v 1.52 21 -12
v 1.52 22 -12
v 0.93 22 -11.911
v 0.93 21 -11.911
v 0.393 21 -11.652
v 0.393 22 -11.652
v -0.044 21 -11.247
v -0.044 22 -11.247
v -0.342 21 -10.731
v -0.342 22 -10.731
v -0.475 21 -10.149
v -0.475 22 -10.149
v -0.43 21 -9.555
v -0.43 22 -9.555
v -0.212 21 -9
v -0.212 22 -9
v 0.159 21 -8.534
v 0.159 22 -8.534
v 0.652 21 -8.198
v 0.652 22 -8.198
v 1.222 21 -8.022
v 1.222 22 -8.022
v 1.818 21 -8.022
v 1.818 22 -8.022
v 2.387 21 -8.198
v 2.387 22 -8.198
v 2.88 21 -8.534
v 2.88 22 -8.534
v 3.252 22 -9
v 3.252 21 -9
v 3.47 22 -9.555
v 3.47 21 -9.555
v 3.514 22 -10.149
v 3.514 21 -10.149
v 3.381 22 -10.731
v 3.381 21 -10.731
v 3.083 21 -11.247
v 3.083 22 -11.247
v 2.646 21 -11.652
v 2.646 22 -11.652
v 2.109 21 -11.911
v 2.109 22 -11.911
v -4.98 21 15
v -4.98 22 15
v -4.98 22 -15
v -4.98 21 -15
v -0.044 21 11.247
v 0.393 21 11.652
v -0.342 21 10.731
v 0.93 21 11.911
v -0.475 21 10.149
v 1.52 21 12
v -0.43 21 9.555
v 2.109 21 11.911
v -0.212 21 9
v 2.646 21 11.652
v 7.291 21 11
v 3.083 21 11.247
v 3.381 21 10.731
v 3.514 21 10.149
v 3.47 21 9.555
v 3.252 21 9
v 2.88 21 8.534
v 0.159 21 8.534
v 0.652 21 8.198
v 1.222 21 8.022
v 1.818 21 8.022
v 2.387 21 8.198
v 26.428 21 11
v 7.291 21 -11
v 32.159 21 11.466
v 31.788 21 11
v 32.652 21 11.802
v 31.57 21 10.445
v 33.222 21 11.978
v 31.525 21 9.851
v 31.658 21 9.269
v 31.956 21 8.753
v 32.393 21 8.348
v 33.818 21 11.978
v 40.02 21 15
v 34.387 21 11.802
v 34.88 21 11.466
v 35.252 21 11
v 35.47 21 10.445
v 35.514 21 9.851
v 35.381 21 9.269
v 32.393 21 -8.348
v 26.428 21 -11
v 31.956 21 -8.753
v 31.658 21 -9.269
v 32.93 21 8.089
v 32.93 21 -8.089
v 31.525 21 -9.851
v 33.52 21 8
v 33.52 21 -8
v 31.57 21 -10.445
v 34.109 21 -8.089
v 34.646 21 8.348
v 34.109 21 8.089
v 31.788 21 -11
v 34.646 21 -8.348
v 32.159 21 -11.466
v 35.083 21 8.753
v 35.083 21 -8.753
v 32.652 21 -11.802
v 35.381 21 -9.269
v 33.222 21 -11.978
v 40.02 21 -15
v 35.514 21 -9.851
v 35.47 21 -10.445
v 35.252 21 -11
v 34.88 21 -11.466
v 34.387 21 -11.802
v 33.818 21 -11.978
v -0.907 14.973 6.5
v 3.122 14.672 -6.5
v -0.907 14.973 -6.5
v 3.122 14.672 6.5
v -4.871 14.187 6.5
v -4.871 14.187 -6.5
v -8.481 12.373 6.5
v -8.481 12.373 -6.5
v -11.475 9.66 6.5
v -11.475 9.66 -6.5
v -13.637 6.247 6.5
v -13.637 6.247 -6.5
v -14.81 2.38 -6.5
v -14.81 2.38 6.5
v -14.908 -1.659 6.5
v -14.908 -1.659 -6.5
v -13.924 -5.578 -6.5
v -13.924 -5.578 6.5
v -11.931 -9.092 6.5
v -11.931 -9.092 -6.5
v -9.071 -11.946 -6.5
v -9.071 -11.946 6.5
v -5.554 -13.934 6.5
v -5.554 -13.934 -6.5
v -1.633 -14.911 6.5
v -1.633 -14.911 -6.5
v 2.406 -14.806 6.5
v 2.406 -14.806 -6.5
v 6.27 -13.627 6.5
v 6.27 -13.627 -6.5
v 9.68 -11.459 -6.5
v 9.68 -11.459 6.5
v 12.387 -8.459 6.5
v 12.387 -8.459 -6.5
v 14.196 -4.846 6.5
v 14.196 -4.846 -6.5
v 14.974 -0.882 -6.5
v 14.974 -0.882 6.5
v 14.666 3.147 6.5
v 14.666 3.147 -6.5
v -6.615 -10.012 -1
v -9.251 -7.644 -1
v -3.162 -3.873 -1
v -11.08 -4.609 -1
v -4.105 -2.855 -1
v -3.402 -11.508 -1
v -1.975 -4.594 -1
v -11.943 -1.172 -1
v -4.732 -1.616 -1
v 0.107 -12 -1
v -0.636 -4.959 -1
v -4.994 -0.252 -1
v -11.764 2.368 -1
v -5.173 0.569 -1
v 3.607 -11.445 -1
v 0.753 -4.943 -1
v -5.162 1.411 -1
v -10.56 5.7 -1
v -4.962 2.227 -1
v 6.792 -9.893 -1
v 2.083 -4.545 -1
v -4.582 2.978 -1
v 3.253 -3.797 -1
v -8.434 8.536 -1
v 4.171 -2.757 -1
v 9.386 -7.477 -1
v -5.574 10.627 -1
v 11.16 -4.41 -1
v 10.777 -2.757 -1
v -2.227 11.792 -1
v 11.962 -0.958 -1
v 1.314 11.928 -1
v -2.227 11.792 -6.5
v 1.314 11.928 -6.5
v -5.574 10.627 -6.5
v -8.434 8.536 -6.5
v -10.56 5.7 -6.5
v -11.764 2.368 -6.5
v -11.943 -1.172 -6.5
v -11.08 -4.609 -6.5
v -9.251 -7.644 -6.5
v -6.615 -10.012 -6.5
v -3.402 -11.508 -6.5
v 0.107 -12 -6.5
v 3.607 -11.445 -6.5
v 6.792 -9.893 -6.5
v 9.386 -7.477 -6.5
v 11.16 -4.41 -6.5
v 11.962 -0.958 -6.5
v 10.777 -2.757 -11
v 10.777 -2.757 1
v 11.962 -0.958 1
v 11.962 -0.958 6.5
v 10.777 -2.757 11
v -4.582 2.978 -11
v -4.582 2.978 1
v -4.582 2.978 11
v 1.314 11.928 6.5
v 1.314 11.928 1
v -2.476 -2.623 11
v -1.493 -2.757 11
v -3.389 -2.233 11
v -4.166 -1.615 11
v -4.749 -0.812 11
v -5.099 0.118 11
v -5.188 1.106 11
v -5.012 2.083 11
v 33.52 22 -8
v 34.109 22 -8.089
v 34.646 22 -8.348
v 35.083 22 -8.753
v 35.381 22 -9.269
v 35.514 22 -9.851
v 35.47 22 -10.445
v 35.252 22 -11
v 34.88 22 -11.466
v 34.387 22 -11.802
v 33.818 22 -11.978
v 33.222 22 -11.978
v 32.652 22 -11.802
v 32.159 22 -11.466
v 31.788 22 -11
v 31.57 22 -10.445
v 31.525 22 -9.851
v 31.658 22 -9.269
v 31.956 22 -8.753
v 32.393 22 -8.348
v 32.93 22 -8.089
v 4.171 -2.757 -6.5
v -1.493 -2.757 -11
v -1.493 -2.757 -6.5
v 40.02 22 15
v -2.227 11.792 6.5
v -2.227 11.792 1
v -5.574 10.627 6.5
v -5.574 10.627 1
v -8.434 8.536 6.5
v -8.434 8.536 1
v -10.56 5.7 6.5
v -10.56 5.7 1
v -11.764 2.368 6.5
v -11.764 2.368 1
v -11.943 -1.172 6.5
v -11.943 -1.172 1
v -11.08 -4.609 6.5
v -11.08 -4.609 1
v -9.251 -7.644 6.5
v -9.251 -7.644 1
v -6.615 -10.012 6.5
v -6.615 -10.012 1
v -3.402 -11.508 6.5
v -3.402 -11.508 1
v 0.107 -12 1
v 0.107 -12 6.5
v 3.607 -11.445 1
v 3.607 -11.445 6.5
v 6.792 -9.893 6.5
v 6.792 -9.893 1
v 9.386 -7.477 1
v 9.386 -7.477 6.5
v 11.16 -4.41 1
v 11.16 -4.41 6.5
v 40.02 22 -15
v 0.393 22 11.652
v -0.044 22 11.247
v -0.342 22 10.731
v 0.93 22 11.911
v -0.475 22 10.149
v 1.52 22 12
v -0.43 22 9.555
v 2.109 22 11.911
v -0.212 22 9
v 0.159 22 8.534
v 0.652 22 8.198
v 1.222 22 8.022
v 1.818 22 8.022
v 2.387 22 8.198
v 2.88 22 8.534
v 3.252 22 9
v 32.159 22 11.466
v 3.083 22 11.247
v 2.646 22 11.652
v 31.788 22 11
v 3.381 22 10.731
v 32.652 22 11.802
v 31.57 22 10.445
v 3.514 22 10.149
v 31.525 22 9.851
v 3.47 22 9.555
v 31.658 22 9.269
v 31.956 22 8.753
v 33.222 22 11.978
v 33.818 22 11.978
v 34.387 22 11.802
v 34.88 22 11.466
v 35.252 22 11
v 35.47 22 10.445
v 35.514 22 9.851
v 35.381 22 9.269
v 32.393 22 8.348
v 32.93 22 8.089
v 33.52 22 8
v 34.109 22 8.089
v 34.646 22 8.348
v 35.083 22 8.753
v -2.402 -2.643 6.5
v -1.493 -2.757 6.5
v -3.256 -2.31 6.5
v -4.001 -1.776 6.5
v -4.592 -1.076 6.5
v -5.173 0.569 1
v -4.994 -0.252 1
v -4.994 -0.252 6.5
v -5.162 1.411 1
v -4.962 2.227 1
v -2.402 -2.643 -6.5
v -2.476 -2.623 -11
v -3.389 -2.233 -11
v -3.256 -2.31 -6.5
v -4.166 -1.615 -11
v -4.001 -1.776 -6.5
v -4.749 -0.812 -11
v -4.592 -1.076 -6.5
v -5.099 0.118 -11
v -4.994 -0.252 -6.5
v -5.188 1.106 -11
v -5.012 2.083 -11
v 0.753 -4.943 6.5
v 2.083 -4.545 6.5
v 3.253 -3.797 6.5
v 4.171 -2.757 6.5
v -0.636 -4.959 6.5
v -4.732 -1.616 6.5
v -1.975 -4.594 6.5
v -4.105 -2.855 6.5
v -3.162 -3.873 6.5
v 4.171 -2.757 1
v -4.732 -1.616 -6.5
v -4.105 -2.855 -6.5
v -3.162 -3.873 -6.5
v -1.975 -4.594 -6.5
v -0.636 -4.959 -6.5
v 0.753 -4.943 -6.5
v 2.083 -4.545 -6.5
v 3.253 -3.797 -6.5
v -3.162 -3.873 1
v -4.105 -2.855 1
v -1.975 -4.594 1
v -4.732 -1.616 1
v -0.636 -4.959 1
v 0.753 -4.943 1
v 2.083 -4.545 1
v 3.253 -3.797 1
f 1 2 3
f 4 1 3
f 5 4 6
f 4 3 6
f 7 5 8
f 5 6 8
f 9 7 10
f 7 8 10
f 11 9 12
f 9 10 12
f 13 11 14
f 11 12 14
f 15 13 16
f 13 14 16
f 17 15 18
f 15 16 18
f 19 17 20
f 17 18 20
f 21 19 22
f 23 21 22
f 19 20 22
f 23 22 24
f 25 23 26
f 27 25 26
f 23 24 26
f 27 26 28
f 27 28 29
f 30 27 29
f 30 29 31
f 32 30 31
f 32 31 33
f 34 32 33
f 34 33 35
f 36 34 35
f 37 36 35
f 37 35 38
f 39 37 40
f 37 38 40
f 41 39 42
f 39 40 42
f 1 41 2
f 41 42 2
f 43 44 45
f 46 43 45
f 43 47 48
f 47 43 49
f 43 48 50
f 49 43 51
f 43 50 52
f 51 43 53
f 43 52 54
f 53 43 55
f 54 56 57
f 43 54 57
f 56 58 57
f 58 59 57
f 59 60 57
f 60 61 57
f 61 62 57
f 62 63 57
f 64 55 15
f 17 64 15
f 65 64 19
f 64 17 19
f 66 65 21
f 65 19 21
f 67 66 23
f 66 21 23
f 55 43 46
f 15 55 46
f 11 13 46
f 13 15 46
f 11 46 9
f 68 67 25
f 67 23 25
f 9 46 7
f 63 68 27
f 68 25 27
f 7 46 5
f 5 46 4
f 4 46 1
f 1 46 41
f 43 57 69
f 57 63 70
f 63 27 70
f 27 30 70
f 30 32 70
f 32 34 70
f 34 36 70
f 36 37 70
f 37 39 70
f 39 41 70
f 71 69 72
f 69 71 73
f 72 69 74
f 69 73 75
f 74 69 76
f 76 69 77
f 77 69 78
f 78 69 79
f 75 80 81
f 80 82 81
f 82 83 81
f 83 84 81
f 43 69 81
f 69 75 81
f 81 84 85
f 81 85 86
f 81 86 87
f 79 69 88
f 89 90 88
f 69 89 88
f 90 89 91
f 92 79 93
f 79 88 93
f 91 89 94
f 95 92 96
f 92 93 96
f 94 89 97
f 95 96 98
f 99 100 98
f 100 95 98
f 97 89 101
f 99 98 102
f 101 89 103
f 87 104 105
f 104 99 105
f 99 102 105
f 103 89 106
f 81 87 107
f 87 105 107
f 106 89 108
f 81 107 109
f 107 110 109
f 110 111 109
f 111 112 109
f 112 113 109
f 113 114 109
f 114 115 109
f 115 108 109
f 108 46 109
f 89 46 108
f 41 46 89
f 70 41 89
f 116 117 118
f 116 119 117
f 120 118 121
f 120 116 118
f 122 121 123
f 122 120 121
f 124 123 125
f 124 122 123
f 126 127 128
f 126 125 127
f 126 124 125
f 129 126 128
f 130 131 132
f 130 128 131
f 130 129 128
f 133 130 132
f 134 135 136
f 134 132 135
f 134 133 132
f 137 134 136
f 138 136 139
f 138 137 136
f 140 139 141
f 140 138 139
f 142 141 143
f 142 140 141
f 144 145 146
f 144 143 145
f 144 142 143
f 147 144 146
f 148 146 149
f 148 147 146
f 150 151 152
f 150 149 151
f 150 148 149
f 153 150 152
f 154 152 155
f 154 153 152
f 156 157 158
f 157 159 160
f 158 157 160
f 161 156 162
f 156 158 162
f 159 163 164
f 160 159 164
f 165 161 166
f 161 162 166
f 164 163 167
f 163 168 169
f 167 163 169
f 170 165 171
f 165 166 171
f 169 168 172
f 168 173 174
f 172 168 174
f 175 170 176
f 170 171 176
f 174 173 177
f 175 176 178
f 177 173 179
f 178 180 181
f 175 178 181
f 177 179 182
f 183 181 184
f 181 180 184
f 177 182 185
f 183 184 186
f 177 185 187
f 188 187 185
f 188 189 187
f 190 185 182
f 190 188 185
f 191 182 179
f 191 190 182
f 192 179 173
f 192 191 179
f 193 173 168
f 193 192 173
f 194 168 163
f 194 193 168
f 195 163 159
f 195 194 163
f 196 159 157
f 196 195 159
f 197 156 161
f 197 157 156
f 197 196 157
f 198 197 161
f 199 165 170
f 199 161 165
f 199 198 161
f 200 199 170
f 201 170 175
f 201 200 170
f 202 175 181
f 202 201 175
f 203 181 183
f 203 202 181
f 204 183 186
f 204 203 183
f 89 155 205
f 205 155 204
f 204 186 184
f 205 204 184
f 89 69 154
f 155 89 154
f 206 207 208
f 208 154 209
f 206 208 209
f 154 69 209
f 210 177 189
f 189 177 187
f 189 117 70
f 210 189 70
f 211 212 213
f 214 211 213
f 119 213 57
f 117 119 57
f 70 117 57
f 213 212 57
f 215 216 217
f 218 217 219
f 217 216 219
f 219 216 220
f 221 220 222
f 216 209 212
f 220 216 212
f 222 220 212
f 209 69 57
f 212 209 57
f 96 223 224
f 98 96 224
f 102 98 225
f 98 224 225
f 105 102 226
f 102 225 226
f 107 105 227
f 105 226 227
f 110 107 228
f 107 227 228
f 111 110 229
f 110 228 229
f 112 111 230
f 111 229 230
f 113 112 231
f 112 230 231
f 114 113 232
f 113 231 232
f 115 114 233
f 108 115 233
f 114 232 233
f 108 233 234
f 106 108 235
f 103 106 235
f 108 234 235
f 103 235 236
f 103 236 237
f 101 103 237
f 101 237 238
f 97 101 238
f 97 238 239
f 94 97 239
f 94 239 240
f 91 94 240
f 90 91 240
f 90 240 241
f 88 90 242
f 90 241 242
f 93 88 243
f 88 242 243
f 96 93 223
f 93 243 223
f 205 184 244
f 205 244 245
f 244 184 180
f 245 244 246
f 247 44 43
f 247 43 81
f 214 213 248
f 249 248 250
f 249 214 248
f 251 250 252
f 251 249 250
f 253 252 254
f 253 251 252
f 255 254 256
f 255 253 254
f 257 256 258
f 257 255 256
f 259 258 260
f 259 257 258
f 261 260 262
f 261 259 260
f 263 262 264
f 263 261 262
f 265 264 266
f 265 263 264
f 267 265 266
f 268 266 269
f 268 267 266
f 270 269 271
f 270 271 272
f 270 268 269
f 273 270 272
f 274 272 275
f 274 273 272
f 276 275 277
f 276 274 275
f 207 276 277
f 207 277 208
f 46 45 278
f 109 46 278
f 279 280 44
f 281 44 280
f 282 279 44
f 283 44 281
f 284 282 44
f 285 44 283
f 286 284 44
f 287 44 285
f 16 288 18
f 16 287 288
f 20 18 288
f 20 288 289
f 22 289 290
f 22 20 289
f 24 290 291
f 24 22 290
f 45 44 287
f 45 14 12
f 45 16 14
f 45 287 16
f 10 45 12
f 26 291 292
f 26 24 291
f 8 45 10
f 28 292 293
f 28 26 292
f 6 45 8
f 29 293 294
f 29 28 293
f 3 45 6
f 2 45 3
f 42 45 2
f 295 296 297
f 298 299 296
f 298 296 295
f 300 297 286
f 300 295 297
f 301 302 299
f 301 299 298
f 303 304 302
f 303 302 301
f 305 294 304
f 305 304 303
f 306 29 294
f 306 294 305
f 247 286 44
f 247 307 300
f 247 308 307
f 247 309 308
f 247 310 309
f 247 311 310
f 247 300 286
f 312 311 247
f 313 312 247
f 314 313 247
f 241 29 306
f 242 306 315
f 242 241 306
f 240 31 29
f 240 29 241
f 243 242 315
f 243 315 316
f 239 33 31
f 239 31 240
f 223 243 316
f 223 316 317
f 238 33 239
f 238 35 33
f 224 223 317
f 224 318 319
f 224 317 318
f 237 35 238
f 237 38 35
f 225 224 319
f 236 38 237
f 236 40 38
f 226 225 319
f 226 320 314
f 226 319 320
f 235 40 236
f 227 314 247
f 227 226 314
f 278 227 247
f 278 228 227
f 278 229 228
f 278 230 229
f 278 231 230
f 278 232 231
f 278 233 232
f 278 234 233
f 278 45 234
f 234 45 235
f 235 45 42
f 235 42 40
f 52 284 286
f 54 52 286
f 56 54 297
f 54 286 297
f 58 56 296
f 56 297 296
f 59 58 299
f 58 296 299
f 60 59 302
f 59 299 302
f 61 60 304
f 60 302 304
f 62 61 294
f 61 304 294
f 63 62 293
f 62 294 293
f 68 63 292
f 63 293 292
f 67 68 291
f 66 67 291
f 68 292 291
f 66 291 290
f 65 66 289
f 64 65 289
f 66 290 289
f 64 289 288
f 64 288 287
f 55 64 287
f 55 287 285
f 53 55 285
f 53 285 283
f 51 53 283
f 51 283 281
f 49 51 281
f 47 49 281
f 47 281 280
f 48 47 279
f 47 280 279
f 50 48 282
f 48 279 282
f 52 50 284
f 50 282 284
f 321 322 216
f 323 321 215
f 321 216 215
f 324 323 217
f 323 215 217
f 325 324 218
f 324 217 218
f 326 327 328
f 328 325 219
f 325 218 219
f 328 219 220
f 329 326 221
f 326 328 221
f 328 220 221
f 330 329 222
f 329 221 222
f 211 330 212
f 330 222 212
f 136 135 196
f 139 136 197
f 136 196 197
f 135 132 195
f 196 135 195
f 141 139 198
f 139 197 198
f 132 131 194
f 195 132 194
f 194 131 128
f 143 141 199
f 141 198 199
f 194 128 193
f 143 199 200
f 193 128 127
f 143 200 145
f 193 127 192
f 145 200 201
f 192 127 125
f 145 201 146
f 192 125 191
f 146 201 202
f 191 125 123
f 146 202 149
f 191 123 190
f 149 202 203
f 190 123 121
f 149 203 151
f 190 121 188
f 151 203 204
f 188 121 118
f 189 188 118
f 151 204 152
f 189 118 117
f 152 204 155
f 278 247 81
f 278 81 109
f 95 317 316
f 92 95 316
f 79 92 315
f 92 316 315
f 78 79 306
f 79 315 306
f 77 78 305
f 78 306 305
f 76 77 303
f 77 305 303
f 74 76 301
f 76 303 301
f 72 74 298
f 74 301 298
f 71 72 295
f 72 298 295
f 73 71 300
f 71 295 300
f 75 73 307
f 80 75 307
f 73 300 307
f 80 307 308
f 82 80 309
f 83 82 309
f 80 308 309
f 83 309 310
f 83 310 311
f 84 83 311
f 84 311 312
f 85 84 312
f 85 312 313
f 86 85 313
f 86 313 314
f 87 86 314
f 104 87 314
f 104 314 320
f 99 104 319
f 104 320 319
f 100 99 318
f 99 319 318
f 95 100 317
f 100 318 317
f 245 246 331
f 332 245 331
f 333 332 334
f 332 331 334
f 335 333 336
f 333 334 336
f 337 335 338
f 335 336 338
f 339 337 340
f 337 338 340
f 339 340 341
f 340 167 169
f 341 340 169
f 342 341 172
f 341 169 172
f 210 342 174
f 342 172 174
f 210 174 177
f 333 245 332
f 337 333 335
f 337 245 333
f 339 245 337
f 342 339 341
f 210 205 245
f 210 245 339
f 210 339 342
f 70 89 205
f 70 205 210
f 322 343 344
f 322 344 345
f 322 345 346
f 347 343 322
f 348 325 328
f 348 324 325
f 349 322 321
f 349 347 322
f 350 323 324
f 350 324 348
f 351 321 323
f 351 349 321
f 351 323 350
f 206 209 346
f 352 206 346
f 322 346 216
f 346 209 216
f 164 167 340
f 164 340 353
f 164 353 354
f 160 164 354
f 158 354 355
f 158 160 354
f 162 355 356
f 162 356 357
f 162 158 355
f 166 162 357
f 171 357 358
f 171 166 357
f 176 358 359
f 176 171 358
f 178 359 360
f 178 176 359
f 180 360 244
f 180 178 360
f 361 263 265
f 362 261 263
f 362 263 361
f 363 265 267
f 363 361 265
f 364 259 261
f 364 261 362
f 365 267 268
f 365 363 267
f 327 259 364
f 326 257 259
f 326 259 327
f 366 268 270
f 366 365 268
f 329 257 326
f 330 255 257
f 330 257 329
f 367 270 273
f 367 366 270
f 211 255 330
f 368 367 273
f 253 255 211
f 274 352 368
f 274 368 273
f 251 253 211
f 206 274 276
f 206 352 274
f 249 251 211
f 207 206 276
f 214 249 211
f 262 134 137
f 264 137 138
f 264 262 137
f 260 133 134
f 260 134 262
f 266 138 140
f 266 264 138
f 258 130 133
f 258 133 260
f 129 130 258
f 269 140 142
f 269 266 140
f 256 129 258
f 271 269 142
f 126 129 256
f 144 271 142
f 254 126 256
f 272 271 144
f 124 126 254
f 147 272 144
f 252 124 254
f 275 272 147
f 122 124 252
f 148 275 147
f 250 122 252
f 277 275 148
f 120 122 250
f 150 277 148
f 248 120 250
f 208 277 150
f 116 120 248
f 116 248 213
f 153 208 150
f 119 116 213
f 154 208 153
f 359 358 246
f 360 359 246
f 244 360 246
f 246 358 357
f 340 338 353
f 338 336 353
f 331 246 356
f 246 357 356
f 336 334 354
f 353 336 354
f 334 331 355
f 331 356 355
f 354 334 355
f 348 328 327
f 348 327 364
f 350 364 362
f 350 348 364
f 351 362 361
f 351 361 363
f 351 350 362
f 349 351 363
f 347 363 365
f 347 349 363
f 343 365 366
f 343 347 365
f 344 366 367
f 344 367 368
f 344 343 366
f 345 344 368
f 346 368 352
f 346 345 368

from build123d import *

# Parameters (mm, degrees)
CROQUIS1_R              = 15
CROQUIS1_R_2            = 12
EXTRUIR_L_MINA1_DEPTH   = 6.5
CROQUIS2_R              = 5
SALIENTE_EXTRUIR1_DEPTH = 6.5
CROQUIS3_R              = 12.5
SALIENTE_EXTRUIR2_DEPTH = 1
CROQUIS4_R              = 2
SALIENTE_EXTRUIR3_DEPTH = 11
SALIENTE_EXTRUIR4_DEPTH = 22
CROQUIS7_W              = 45
CROQUIS7_H              = 30
CROQUIS7_R              = 2
SALIENTE_EXTRUIR5_DEPTH = 1


with BuildPart() as part:
    # Croquis1 → Extruir-Lámina1 (new, symmetric)
    with BuildSketch(Plane.XY):
        Circle(CROQUIS1_R)
        Circle(CROQUIS1_R_2, mode=Mode.SUBTRACT)
    extrude(amount=EXTRUIR_L_MINA1_DEPTH, both=True)



with BuildPart() as body_2:
    # Croquis2 → Saliente-Extruir1 (new, symmetric)
    with BuildSketch(Plane.XY):
        with Locations(Location((0, 0, 0), (0, 0, 180))):
            Circle(CROQUIS2_R)
    extrude(amount=SALIENTE_EXTRUIR1_DEPTH, both=True)


with BuildPart() as part_1:
    add(part.part)

    add(body_2.part)  # Saliente-Extruir2 merges body 2
    # Croquis3 → Saliente-Extruir2 (add, symmetric)
    with BuildSketch(Plane.XY):
        Circle(CROQUIS3_R)
    extrude(amount=SALIENTE_EXTRUIR2_DEPTH, both=True)

    # Croquis4 → Saliente-Extruir3 (add, symmetric)
    with BuildSketch(Plane.XY):
        Circle(CROQUIS4_R)
    extrude(amount=SALIENTE_EXTRUIR3_DEPTH, both=True)

    # Croquis6 → Saliente-Extruir4 (add, through all)
    with BuildSketch(Plane.XY.offset(11)):
        with BuildLine():
            Line((-4.581858608, 2.977952867), (7.949667258, 22))
            Line((7.949667258, 22), (27.086339579, 22))
            Line((27.086339579, 22), (10.776903307, -2.756671198))
            Line((10.776903307, -2.756671198), (-1.492562871, -2.756671198))
            ThreePointArc((-1.492562871, -2.756671198), (-4.749465591, -0.811766904), (-4.581858608, 2.977952867))
        make_face()
    extrude(amount=-SALIENTE_EXTRUIR4_DEPTH)

    # Croquis7 → Saliente-Extruir5 (add)
    with BuildSketch(Plane(origin=(0, 22, 0), x_dir=(1, 0, 0), z_dir=(0, 1, 0))):
        with Locations((17.519667258, 0)):
            Rectangle(CROQUIS7_W, CROQUIS7_H)
        with Locations(Location((33.519667258, 10, 0), (0, 0, 270))):
            Circle(CROQUIS7_R, mode=Mode.SUBTRACT)
        with Locations(Location((1.519667258, 10, 0), (0, 0, 90))):
            Circle(CROQUIS7_R, mode=Mode.SUBTRACT)
        with Locations(Location((33.519667258, -10, 0), (0, 0, 90))):
            Circle(CROQUIS7_R, mode=Mode.SUBTRACT)
        with Locations(Location((1.519667258, -10, 0), (0, 0, 270))):
            Circle(CROQUIS7_R, mode=Mode.SUBTRACT)
    extrude(amount=-SALIENTE_EXTRUIR5_DEPTH)


solid = part_1.part
